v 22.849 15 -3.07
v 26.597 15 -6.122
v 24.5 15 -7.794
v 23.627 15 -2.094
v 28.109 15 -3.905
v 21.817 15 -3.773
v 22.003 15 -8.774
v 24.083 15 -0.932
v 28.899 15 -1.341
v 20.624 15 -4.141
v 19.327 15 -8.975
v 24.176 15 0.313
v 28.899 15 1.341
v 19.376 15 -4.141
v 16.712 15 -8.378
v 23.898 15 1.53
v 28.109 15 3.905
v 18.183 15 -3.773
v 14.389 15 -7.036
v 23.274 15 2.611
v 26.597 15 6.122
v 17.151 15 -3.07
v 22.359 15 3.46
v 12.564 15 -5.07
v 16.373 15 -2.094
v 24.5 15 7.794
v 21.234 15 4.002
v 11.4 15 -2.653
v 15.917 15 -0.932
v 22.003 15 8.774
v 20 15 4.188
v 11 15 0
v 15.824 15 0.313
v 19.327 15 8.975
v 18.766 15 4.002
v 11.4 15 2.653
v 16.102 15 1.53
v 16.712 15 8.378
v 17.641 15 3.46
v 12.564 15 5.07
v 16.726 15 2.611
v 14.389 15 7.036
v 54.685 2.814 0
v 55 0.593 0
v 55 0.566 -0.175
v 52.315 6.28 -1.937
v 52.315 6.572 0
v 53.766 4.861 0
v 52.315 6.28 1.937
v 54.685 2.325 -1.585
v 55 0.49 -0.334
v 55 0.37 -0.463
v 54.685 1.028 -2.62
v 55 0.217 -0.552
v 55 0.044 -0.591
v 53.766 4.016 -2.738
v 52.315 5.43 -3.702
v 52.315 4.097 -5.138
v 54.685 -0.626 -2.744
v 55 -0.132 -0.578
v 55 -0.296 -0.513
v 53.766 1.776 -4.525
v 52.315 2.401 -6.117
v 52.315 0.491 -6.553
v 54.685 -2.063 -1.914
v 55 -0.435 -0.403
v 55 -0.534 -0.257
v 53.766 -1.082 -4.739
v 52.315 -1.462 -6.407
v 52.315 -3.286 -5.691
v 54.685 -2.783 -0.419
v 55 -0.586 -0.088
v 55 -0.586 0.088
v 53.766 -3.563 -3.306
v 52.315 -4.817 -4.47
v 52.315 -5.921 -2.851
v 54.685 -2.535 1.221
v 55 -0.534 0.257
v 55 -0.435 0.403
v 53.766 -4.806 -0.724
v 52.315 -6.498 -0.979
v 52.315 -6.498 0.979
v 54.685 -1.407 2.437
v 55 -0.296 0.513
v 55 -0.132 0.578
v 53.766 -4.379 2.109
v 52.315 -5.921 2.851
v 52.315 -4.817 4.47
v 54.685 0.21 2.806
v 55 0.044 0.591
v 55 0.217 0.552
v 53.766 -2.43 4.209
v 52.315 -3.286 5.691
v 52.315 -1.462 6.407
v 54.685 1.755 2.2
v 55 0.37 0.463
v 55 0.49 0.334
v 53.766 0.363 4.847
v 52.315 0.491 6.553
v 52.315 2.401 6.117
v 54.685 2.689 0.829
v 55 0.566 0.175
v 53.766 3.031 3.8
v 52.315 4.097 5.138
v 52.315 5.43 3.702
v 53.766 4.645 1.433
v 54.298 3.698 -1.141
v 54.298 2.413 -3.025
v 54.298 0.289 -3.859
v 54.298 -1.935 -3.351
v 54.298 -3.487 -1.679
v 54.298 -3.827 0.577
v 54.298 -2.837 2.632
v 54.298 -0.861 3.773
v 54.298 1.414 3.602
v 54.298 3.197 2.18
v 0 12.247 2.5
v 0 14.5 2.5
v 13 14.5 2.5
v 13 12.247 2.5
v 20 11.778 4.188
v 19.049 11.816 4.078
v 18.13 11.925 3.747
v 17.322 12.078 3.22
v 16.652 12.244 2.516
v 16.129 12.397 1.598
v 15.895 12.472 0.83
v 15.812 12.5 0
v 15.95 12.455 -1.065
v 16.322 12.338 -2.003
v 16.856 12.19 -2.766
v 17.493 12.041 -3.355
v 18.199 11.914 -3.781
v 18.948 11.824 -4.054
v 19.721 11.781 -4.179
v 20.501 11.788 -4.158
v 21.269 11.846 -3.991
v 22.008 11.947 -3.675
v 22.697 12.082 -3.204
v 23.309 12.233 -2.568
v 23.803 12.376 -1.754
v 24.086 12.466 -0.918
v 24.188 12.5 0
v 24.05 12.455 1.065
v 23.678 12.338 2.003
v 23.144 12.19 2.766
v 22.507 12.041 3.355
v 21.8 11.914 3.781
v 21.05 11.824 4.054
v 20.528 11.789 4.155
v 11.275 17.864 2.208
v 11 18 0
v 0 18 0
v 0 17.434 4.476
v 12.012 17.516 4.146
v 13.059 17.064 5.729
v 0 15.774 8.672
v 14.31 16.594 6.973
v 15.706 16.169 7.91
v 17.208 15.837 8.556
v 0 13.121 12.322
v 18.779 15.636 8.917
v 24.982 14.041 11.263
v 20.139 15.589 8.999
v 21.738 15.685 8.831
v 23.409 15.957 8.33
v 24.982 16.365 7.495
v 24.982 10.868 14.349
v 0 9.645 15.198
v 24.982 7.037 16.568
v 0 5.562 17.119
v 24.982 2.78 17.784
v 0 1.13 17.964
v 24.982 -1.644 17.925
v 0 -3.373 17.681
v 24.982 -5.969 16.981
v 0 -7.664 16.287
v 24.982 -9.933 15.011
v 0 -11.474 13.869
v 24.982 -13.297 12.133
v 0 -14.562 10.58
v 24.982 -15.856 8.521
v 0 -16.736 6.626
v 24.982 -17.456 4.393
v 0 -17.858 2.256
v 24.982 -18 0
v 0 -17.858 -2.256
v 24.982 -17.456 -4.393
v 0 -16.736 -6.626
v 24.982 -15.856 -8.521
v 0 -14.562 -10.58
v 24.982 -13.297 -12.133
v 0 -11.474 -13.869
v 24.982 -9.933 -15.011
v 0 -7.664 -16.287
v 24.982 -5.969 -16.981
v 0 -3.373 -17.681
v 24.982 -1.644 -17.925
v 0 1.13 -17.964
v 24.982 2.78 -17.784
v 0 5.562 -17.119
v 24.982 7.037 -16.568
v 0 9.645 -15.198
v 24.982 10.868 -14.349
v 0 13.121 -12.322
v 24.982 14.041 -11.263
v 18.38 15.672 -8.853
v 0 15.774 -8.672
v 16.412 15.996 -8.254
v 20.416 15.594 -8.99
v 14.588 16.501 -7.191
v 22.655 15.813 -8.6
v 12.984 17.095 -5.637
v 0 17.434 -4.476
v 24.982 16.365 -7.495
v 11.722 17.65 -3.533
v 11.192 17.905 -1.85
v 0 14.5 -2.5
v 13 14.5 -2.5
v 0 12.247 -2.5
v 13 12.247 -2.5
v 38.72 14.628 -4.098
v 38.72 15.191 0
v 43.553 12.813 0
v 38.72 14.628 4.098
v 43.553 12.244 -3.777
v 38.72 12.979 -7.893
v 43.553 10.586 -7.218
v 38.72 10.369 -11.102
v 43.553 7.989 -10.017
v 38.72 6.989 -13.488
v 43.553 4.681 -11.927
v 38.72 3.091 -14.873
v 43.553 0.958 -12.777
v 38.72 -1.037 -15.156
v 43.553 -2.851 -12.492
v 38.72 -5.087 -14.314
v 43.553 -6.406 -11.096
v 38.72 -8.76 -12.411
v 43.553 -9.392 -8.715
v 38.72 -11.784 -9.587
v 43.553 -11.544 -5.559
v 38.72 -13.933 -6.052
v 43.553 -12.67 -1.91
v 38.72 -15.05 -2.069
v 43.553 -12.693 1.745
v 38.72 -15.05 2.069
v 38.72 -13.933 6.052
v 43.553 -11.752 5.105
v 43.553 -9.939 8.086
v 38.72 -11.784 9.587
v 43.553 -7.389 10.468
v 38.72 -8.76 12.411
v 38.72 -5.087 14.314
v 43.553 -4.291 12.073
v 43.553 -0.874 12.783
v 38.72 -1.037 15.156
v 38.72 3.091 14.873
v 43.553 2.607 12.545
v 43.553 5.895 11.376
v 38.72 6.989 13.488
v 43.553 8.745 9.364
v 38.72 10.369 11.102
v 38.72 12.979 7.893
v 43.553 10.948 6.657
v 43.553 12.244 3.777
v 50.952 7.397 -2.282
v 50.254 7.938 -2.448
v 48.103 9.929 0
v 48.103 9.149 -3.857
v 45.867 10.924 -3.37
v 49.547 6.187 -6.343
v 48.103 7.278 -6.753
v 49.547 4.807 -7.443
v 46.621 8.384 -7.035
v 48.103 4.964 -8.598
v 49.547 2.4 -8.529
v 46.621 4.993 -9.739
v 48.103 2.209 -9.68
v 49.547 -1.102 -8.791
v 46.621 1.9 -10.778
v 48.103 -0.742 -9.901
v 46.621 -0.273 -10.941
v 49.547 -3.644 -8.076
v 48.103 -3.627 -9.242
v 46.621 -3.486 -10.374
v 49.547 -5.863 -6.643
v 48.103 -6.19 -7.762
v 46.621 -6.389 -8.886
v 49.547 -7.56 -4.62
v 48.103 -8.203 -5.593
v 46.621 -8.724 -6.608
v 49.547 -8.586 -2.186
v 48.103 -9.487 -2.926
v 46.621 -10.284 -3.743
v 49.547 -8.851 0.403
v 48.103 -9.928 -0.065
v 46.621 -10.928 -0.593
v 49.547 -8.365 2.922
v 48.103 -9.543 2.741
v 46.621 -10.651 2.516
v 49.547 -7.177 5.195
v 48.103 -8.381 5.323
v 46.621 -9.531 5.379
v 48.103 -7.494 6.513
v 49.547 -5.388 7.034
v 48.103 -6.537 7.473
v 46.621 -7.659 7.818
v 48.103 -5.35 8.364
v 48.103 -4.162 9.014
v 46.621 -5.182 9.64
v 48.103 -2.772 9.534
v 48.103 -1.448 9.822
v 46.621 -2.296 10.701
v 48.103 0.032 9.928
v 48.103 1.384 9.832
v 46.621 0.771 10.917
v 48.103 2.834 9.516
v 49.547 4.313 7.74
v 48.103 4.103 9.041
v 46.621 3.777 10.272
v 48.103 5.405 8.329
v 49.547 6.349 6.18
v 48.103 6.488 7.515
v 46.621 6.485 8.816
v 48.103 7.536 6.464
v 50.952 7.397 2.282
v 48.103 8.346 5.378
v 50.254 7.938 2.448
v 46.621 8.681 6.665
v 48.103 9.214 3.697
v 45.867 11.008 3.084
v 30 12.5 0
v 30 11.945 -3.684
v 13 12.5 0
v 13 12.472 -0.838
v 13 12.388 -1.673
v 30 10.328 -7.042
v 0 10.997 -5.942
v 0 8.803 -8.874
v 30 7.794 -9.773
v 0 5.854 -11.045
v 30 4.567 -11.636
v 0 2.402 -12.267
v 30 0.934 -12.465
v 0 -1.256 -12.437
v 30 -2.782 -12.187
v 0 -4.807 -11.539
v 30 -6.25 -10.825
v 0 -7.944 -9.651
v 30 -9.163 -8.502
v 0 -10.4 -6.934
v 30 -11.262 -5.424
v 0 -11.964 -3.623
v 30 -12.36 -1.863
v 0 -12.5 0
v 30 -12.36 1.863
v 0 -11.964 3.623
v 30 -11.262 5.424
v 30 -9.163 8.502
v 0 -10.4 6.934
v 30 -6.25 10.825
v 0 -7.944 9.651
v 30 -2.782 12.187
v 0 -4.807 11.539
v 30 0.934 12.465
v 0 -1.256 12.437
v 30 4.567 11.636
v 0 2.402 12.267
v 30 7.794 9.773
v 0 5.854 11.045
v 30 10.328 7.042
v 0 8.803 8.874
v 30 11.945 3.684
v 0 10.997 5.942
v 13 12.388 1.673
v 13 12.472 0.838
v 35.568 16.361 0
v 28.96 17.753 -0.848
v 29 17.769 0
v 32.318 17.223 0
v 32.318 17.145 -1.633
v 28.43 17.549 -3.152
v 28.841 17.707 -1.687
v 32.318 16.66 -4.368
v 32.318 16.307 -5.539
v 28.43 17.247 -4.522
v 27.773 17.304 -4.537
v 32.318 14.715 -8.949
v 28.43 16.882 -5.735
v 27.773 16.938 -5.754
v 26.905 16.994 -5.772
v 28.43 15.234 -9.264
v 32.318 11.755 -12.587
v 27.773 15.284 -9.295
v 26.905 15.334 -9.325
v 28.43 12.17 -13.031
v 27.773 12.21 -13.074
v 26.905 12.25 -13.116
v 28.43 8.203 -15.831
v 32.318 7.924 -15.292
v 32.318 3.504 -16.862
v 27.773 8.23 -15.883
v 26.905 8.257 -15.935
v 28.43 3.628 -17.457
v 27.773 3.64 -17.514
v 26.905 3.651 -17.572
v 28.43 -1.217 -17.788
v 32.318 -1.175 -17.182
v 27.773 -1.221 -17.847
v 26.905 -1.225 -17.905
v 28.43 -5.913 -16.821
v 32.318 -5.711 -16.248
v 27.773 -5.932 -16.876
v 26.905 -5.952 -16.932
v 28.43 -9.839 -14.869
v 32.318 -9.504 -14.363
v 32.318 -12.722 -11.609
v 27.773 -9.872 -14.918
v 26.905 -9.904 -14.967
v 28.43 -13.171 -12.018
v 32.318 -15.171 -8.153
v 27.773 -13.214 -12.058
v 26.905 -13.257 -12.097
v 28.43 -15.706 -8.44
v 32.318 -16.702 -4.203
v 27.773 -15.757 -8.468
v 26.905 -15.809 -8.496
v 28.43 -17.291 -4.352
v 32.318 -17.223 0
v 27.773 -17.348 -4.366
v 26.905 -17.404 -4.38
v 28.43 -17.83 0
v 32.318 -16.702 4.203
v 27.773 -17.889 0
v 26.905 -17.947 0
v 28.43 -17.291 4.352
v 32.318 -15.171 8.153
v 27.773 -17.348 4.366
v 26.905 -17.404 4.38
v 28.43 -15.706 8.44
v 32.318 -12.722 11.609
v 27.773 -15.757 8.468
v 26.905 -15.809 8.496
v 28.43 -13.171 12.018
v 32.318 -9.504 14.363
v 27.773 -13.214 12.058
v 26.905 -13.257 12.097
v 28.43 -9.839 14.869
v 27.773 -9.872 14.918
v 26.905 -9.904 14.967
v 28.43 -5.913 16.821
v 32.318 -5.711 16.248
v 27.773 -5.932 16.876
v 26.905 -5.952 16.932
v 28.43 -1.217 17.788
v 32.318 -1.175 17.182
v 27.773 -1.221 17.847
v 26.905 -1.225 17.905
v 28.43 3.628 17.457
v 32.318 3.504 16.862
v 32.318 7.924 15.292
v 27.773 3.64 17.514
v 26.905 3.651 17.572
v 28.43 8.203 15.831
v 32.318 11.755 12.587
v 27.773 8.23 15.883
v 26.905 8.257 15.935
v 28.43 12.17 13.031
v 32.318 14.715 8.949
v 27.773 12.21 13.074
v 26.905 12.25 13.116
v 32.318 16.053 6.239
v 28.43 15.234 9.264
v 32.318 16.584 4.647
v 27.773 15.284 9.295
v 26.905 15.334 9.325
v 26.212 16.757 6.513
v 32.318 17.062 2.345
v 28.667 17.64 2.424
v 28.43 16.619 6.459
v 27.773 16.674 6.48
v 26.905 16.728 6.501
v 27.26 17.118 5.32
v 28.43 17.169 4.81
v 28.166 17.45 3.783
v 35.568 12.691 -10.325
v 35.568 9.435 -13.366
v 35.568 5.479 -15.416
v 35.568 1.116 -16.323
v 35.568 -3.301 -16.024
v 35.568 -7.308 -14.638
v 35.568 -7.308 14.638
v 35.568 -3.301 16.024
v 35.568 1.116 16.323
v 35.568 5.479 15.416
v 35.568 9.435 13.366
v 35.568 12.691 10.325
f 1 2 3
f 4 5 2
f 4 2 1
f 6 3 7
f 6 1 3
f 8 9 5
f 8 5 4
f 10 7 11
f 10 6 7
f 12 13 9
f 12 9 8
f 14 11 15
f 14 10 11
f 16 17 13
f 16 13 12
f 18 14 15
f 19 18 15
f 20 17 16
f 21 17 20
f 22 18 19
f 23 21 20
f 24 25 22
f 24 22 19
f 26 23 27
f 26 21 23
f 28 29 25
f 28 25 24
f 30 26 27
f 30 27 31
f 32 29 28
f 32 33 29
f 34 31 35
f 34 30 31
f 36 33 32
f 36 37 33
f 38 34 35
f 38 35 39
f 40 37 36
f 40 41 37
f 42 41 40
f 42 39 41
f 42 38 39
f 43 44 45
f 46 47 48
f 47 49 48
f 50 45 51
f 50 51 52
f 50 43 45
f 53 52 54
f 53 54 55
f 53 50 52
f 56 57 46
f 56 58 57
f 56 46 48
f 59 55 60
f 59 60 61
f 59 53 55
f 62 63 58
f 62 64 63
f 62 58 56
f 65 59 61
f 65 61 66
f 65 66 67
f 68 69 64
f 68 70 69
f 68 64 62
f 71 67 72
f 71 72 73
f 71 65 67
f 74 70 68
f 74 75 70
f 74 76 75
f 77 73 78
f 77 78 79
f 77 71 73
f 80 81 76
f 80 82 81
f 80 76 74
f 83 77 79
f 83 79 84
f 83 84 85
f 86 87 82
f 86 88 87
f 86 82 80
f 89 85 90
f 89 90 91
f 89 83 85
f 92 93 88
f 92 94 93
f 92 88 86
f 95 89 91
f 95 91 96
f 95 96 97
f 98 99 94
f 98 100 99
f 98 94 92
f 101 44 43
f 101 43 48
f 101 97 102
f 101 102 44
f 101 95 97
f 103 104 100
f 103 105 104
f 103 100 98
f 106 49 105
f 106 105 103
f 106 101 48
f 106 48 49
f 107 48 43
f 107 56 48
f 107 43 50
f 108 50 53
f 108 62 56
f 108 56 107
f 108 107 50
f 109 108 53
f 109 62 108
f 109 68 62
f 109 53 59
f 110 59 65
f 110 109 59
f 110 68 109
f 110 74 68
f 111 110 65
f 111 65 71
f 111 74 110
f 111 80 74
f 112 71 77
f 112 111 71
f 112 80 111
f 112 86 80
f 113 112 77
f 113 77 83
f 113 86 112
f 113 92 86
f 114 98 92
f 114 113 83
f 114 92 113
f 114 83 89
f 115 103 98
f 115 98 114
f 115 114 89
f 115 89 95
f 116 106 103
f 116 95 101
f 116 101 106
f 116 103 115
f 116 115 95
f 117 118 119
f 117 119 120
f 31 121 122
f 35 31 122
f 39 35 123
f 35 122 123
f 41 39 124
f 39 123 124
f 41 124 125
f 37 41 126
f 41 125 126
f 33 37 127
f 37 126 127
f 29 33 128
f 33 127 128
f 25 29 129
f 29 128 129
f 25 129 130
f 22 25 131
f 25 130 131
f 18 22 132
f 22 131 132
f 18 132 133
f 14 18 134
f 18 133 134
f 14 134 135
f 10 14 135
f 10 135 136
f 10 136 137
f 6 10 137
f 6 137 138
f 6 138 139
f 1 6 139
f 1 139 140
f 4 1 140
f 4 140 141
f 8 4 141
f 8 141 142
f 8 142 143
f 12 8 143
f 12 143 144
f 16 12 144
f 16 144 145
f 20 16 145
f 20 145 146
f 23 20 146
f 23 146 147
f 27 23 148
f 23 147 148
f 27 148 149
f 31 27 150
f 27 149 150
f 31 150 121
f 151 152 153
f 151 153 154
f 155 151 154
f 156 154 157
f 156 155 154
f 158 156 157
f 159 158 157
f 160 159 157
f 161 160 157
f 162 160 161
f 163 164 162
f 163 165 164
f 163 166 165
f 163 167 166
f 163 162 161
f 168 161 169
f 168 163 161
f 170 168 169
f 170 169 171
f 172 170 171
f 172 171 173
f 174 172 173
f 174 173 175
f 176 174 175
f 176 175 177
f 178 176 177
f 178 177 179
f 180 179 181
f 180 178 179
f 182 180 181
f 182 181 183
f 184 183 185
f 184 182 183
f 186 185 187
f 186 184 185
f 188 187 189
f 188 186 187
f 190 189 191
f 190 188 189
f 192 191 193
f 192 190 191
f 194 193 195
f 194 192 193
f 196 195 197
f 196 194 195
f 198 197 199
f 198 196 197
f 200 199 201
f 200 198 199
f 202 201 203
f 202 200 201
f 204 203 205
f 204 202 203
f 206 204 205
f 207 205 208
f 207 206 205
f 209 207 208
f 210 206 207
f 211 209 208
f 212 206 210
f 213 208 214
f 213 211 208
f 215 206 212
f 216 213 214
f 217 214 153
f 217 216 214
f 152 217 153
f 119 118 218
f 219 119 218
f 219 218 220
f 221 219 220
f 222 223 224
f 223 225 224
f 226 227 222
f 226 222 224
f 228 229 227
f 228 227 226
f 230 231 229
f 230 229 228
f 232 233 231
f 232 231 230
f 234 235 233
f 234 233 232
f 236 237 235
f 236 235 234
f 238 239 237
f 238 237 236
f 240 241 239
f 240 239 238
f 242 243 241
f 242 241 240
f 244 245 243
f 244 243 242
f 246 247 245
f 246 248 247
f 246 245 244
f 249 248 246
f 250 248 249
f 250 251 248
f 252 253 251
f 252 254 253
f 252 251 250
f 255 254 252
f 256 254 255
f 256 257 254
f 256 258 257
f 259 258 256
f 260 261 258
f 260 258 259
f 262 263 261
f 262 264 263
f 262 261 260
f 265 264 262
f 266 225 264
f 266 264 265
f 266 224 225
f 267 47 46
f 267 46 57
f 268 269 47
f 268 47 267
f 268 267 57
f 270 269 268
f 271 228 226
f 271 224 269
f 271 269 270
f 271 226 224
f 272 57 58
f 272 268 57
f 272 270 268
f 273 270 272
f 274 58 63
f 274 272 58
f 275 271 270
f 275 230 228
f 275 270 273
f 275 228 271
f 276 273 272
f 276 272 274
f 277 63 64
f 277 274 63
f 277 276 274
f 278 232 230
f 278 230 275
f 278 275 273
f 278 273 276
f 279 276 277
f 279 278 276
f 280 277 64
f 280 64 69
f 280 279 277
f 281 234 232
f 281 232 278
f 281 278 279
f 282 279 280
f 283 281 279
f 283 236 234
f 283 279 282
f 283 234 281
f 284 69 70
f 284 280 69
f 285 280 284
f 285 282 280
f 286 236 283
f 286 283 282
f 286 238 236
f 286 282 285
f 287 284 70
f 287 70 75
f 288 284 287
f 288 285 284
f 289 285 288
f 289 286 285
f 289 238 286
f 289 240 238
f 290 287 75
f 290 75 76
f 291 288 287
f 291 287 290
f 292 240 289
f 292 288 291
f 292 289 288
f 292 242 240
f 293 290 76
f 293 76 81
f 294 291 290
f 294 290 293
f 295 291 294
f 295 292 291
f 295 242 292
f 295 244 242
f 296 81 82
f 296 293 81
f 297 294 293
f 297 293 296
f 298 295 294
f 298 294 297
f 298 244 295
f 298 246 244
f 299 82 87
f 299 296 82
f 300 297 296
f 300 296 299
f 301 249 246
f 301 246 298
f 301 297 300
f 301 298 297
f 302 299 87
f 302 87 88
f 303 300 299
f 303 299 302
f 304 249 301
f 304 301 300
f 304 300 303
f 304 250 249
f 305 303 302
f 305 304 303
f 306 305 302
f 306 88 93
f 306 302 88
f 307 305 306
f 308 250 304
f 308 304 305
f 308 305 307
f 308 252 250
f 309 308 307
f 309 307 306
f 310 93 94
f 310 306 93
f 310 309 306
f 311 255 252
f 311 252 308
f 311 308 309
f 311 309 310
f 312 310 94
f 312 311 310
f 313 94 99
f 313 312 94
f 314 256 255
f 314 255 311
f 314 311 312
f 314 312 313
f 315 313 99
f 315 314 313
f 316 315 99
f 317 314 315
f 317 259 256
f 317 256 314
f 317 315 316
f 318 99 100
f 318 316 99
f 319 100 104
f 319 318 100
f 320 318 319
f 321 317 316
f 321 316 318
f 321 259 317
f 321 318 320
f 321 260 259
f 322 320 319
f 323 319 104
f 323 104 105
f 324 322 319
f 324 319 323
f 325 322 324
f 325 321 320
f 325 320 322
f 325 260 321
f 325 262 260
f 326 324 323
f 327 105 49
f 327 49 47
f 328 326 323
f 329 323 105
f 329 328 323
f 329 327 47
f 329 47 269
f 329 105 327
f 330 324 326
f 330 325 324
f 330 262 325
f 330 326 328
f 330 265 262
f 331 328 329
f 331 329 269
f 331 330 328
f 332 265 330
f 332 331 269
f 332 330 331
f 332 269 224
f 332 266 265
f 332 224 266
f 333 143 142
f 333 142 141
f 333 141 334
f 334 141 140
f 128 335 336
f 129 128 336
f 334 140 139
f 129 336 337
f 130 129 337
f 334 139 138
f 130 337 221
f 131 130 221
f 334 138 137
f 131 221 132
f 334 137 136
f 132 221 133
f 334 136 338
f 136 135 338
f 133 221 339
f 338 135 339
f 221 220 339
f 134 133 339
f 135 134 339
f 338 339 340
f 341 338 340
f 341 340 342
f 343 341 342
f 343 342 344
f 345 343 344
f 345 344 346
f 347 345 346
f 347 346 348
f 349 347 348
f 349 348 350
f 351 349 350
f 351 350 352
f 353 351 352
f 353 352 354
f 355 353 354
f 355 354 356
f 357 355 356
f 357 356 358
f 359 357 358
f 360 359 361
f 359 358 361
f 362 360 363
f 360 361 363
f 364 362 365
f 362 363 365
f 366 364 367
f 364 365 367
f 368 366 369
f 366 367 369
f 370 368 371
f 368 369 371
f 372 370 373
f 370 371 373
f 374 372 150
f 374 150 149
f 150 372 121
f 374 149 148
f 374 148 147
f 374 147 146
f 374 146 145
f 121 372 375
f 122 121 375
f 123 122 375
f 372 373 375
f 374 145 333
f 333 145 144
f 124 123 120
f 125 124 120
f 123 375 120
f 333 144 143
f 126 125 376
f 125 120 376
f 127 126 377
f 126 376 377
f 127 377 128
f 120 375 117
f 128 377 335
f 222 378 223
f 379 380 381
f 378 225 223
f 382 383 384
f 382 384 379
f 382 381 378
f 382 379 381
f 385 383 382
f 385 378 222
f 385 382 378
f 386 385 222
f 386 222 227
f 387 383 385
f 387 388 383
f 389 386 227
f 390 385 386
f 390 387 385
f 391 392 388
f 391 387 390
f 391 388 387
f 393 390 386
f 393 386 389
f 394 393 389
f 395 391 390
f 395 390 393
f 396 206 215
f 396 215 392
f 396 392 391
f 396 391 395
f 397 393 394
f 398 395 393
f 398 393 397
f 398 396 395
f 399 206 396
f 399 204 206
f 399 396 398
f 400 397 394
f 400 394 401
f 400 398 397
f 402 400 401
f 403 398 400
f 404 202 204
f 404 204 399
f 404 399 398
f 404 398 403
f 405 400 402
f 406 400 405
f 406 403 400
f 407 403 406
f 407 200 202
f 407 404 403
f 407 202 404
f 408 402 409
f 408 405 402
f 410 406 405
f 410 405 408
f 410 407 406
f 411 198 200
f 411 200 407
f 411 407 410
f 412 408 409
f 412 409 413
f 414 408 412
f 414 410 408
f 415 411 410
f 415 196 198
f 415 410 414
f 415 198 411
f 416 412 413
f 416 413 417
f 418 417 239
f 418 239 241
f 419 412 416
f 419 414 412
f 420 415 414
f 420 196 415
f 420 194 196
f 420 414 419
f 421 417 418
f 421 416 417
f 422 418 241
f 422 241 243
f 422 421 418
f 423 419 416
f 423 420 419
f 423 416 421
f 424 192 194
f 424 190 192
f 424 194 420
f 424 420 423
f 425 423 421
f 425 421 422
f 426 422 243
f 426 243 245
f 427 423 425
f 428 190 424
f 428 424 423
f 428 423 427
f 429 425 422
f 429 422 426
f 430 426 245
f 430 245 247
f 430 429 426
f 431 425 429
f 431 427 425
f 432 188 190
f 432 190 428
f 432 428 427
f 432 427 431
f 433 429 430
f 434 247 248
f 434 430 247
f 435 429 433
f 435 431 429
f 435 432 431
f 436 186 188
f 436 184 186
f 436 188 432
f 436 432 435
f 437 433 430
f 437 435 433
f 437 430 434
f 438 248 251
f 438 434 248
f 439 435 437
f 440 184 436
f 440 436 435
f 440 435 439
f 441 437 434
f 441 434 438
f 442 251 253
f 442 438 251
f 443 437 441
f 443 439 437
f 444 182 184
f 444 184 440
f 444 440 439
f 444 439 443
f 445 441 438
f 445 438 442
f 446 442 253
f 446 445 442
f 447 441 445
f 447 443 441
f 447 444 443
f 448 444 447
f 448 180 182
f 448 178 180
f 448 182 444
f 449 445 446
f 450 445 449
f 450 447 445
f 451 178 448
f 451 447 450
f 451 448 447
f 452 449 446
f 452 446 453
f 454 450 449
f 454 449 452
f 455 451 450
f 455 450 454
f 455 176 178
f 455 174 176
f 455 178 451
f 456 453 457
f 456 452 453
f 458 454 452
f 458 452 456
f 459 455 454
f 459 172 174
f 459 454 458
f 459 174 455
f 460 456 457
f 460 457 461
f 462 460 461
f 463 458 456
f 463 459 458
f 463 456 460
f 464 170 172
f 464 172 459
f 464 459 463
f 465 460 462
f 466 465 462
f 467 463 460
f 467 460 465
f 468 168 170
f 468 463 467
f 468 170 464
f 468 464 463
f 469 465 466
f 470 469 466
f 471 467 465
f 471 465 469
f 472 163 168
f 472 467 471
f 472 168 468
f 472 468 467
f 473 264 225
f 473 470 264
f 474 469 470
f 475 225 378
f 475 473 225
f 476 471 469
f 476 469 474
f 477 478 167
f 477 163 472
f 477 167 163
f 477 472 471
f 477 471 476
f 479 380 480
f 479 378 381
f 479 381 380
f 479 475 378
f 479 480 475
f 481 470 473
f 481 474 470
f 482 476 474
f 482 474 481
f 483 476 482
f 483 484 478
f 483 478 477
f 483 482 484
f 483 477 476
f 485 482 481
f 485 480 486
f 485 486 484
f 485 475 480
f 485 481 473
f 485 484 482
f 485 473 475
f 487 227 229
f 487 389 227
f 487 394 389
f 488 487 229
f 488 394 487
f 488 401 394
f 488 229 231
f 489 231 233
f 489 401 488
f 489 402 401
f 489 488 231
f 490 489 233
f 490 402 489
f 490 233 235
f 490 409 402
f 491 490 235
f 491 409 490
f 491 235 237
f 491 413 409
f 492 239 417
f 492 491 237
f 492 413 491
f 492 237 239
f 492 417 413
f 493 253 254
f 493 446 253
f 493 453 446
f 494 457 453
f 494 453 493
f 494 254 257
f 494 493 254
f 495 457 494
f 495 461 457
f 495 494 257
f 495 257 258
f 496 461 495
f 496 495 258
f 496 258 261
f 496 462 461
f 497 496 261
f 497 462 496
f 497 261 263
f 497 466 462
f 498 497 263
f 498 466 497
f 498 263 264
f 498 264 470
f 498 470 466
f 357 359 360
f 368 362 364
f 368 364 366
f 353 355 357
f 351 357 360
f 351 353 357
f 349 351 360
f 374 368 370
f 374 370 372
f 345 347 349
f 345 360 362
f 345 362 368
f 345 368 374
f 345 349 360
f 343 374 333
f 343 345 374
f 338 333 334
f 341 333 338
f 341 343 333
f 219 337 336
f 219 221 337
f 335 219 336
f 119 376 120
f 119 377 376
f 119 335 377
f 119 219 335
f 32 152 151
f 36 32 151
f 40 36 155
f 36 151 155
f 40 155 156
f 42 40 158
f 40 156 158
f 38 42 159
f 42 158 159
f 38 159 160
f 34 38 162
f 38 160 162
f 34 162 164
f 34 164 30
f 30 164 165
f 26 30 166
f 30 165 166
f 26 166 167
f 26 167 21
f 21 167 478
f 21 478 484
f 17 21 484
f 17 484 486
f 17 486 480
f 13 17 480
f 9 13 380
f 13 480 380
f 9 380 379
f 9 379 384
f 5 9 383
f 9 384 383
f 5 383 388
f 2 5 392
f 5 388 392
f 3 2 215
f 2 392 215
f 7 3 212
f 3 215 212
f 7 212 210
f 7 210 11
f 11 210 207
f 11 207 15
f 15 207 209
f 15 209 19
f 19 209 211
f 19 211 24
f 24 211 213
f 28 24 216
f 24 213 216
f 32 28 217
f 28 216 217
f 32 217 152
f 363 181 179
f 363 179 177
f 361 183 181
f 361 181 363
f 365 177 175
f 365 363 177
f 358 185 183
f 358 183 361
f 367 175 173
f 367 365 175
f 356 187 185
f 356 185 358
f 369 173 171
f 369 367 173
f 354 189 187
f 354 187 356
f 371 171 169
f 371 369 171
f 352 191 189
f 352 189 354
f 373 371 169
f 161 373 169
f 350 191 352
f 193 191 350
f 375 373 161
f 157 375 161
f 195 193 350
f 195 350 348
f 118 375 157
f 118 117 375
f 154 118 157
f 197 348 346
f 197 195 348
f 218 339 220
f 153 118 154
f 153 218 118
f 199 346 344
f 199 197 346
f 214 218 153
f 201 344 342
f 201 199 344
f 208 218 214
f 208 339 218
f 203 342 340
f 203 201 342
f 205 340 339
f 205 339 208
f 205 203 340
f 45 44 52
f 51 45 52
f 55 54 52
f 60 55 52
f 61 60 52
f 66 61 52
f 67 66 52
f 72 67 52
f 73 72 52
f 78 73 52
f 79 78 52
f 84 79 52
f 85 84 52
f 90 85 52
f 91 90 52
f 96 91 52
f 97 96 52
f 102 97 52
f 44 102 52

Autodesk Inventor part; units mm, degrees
ref_plane "YZ Plane" through (0, 0, 0) normal (1, 0, 0) x (0, 1, 0)
ref_plane "XZ Plane" through (0, 0, 0) normal (0, 1, 0) x (-1, 0, 0)
sketch "Sketch1" plane through (0, 0, 0) normal (0, 0, 1) x (1, 0, 0)
  line L0 (0, 0) -> (0, 18)
  line L1 (0, 18) -> (55, 18) construction
  line L2 (55, 18) -> (55, 0) construction
  line L3 (0, 18) -> (55, 18) construction
  line L4 (55, 18) -> (55, -18) construction
  line L5 (55, -18) -> (0, -18) construction
  line L6 (0, -18) -> (0, 18)
  line L7 (0, -12.5) -> (30, -12.5)
  line L8 (30, -12.5) -> (30, 12.5)
  line L9 (30, 12.5) -> (0, 12.5)
  line L10 (55, 0) -> (55, 0.5928)
  line L11 (55, 0) -> (30, 0)
  line L12 (30, 0) -> (30, 18) construction
  arc A0 (52.3154, 6.5716) -> (38.7203, 15.191) centre (19.0942, -30.7961) ccw
  line L13 (0, 18) -> (24.982, 18)
  arc A1 (55, 0.5928) -> (52.3154, 6.5716) centre (47, 0.5928) ccw
  arc A2 (38.7203, 15.191) -> (24.982, 18) centre (24.982, -17) ccw
  line L14 (30, 0) -> (30, 0)
  point P0 (55, 4)
  dimension "d0" = 18
  dimension "d1" = 55
  dimension "d2" = 36
  dimension "d5" = 12.5
  dimension "d6" = 30
  dimension "d7" = 25
  dimension "d14" = 4
  dimension "d16" = 0
  dimension "d17" = 25
  dimension "d18" = 8
  dimension "d19" = 35
  dimension "d20" = 50
revolve "Revolution1" add sketch "Sketch1" angle 360 about axis through (55, 0, 0) along (-1, 0, 0) contours L0 L13 A2 A0 A1 L10 L11 L8 L9
sketch "Sketch2" plane through (0, 0, 0) normal (-1, 0, 0) x (0, 0, 1)
  circle A0 centre (0, 0) radius 12.5 projected
  circle A1 centre (0, 0) radius 18 projected
  circle A2 centre (0, 0) radius 0.5928 projected
  line L0 (0, 0) -> (0, 12.5)
  circle A3 centre (0, 0) radius 12.5 projected
  circle A4 centre (0, 0) radius 18 projected
  line L1 (0, 12.5) -> (0, 14.5)
  line L2 (0, 14.5) -> (-2.5, 14.5)
  line L3 (0, 14.5) -> (2.5, 14.5)
  line L4 (0, 14.5) -> (0, 12) construction
  line L5 (2.5, 14.5) -> (2.5, 12.2474)
  line L6 (-2.5, 14.5) -> (-2.5, 12.2474)
  point P0 (0, 0)
  point P1 (-2.5, 12.2474)
  point P2 (2.5, 12.2474)
  dimension "d23" = 2
  dimension "d24" = 2.5
  dimension "d25" = 90
  dimension "d26" = 2.5
  dimension "d27" = 90
extrude "Extrusion1" cut sketch "Sketch2" against normal blind 13 contours A0 L1 L3 L5 | L6 L2 L1 A0
ref_plane "Work Plane1" through (0, 18, 0) normal (0, 1, 0) x (-1, 0, 0)
sketch "Sketch3" plane through (0, 18, 0) normal (0, 1, 0) x (-1, 0, 0)
  line L0 (0, -18) -> (0, 18) projected
  line L1 (-24.982, -18) -> (-24.982, 18) projected
  line L2 (-24.982, -18) -> (-24.982, 18) projected
  line L3 (-38.7203, -15.191) -> (-38.7203, 15.191) projected
  line L4 (-38.7203, -15.191) -> (-38.7203, 15.191) projected
  line L5 (-52.3154, -6.5716) -> (-52.3154, 6.5716) projected
  line L6 (-52.3154, -6.5716) -> (-52.3154, 6.5716) projected
  line L7 (-55, -0.5928) -> (-55, 0.5928) projected
  line L8 (0, 0) -> (-11, 0)
  line L9 (-11, 0) -> (-20, 0)
  circle A0 centre (-20, 0) radius 9
  dimension "d30" = 11
  dimension "d31" = 9
  dimension "d42" = 18
extrude "Extrusion2" cut sketch "Sketch3" against normal blind 3
hole "Hole1" at (20, 18, 0) direction (0, -1, 0) diameter 8.376 depth 18 tip angle 118 thread size "M10x1.5" class "6H" standard "ISO Metric profile"
properties part number "Windmühlen Kopf"
